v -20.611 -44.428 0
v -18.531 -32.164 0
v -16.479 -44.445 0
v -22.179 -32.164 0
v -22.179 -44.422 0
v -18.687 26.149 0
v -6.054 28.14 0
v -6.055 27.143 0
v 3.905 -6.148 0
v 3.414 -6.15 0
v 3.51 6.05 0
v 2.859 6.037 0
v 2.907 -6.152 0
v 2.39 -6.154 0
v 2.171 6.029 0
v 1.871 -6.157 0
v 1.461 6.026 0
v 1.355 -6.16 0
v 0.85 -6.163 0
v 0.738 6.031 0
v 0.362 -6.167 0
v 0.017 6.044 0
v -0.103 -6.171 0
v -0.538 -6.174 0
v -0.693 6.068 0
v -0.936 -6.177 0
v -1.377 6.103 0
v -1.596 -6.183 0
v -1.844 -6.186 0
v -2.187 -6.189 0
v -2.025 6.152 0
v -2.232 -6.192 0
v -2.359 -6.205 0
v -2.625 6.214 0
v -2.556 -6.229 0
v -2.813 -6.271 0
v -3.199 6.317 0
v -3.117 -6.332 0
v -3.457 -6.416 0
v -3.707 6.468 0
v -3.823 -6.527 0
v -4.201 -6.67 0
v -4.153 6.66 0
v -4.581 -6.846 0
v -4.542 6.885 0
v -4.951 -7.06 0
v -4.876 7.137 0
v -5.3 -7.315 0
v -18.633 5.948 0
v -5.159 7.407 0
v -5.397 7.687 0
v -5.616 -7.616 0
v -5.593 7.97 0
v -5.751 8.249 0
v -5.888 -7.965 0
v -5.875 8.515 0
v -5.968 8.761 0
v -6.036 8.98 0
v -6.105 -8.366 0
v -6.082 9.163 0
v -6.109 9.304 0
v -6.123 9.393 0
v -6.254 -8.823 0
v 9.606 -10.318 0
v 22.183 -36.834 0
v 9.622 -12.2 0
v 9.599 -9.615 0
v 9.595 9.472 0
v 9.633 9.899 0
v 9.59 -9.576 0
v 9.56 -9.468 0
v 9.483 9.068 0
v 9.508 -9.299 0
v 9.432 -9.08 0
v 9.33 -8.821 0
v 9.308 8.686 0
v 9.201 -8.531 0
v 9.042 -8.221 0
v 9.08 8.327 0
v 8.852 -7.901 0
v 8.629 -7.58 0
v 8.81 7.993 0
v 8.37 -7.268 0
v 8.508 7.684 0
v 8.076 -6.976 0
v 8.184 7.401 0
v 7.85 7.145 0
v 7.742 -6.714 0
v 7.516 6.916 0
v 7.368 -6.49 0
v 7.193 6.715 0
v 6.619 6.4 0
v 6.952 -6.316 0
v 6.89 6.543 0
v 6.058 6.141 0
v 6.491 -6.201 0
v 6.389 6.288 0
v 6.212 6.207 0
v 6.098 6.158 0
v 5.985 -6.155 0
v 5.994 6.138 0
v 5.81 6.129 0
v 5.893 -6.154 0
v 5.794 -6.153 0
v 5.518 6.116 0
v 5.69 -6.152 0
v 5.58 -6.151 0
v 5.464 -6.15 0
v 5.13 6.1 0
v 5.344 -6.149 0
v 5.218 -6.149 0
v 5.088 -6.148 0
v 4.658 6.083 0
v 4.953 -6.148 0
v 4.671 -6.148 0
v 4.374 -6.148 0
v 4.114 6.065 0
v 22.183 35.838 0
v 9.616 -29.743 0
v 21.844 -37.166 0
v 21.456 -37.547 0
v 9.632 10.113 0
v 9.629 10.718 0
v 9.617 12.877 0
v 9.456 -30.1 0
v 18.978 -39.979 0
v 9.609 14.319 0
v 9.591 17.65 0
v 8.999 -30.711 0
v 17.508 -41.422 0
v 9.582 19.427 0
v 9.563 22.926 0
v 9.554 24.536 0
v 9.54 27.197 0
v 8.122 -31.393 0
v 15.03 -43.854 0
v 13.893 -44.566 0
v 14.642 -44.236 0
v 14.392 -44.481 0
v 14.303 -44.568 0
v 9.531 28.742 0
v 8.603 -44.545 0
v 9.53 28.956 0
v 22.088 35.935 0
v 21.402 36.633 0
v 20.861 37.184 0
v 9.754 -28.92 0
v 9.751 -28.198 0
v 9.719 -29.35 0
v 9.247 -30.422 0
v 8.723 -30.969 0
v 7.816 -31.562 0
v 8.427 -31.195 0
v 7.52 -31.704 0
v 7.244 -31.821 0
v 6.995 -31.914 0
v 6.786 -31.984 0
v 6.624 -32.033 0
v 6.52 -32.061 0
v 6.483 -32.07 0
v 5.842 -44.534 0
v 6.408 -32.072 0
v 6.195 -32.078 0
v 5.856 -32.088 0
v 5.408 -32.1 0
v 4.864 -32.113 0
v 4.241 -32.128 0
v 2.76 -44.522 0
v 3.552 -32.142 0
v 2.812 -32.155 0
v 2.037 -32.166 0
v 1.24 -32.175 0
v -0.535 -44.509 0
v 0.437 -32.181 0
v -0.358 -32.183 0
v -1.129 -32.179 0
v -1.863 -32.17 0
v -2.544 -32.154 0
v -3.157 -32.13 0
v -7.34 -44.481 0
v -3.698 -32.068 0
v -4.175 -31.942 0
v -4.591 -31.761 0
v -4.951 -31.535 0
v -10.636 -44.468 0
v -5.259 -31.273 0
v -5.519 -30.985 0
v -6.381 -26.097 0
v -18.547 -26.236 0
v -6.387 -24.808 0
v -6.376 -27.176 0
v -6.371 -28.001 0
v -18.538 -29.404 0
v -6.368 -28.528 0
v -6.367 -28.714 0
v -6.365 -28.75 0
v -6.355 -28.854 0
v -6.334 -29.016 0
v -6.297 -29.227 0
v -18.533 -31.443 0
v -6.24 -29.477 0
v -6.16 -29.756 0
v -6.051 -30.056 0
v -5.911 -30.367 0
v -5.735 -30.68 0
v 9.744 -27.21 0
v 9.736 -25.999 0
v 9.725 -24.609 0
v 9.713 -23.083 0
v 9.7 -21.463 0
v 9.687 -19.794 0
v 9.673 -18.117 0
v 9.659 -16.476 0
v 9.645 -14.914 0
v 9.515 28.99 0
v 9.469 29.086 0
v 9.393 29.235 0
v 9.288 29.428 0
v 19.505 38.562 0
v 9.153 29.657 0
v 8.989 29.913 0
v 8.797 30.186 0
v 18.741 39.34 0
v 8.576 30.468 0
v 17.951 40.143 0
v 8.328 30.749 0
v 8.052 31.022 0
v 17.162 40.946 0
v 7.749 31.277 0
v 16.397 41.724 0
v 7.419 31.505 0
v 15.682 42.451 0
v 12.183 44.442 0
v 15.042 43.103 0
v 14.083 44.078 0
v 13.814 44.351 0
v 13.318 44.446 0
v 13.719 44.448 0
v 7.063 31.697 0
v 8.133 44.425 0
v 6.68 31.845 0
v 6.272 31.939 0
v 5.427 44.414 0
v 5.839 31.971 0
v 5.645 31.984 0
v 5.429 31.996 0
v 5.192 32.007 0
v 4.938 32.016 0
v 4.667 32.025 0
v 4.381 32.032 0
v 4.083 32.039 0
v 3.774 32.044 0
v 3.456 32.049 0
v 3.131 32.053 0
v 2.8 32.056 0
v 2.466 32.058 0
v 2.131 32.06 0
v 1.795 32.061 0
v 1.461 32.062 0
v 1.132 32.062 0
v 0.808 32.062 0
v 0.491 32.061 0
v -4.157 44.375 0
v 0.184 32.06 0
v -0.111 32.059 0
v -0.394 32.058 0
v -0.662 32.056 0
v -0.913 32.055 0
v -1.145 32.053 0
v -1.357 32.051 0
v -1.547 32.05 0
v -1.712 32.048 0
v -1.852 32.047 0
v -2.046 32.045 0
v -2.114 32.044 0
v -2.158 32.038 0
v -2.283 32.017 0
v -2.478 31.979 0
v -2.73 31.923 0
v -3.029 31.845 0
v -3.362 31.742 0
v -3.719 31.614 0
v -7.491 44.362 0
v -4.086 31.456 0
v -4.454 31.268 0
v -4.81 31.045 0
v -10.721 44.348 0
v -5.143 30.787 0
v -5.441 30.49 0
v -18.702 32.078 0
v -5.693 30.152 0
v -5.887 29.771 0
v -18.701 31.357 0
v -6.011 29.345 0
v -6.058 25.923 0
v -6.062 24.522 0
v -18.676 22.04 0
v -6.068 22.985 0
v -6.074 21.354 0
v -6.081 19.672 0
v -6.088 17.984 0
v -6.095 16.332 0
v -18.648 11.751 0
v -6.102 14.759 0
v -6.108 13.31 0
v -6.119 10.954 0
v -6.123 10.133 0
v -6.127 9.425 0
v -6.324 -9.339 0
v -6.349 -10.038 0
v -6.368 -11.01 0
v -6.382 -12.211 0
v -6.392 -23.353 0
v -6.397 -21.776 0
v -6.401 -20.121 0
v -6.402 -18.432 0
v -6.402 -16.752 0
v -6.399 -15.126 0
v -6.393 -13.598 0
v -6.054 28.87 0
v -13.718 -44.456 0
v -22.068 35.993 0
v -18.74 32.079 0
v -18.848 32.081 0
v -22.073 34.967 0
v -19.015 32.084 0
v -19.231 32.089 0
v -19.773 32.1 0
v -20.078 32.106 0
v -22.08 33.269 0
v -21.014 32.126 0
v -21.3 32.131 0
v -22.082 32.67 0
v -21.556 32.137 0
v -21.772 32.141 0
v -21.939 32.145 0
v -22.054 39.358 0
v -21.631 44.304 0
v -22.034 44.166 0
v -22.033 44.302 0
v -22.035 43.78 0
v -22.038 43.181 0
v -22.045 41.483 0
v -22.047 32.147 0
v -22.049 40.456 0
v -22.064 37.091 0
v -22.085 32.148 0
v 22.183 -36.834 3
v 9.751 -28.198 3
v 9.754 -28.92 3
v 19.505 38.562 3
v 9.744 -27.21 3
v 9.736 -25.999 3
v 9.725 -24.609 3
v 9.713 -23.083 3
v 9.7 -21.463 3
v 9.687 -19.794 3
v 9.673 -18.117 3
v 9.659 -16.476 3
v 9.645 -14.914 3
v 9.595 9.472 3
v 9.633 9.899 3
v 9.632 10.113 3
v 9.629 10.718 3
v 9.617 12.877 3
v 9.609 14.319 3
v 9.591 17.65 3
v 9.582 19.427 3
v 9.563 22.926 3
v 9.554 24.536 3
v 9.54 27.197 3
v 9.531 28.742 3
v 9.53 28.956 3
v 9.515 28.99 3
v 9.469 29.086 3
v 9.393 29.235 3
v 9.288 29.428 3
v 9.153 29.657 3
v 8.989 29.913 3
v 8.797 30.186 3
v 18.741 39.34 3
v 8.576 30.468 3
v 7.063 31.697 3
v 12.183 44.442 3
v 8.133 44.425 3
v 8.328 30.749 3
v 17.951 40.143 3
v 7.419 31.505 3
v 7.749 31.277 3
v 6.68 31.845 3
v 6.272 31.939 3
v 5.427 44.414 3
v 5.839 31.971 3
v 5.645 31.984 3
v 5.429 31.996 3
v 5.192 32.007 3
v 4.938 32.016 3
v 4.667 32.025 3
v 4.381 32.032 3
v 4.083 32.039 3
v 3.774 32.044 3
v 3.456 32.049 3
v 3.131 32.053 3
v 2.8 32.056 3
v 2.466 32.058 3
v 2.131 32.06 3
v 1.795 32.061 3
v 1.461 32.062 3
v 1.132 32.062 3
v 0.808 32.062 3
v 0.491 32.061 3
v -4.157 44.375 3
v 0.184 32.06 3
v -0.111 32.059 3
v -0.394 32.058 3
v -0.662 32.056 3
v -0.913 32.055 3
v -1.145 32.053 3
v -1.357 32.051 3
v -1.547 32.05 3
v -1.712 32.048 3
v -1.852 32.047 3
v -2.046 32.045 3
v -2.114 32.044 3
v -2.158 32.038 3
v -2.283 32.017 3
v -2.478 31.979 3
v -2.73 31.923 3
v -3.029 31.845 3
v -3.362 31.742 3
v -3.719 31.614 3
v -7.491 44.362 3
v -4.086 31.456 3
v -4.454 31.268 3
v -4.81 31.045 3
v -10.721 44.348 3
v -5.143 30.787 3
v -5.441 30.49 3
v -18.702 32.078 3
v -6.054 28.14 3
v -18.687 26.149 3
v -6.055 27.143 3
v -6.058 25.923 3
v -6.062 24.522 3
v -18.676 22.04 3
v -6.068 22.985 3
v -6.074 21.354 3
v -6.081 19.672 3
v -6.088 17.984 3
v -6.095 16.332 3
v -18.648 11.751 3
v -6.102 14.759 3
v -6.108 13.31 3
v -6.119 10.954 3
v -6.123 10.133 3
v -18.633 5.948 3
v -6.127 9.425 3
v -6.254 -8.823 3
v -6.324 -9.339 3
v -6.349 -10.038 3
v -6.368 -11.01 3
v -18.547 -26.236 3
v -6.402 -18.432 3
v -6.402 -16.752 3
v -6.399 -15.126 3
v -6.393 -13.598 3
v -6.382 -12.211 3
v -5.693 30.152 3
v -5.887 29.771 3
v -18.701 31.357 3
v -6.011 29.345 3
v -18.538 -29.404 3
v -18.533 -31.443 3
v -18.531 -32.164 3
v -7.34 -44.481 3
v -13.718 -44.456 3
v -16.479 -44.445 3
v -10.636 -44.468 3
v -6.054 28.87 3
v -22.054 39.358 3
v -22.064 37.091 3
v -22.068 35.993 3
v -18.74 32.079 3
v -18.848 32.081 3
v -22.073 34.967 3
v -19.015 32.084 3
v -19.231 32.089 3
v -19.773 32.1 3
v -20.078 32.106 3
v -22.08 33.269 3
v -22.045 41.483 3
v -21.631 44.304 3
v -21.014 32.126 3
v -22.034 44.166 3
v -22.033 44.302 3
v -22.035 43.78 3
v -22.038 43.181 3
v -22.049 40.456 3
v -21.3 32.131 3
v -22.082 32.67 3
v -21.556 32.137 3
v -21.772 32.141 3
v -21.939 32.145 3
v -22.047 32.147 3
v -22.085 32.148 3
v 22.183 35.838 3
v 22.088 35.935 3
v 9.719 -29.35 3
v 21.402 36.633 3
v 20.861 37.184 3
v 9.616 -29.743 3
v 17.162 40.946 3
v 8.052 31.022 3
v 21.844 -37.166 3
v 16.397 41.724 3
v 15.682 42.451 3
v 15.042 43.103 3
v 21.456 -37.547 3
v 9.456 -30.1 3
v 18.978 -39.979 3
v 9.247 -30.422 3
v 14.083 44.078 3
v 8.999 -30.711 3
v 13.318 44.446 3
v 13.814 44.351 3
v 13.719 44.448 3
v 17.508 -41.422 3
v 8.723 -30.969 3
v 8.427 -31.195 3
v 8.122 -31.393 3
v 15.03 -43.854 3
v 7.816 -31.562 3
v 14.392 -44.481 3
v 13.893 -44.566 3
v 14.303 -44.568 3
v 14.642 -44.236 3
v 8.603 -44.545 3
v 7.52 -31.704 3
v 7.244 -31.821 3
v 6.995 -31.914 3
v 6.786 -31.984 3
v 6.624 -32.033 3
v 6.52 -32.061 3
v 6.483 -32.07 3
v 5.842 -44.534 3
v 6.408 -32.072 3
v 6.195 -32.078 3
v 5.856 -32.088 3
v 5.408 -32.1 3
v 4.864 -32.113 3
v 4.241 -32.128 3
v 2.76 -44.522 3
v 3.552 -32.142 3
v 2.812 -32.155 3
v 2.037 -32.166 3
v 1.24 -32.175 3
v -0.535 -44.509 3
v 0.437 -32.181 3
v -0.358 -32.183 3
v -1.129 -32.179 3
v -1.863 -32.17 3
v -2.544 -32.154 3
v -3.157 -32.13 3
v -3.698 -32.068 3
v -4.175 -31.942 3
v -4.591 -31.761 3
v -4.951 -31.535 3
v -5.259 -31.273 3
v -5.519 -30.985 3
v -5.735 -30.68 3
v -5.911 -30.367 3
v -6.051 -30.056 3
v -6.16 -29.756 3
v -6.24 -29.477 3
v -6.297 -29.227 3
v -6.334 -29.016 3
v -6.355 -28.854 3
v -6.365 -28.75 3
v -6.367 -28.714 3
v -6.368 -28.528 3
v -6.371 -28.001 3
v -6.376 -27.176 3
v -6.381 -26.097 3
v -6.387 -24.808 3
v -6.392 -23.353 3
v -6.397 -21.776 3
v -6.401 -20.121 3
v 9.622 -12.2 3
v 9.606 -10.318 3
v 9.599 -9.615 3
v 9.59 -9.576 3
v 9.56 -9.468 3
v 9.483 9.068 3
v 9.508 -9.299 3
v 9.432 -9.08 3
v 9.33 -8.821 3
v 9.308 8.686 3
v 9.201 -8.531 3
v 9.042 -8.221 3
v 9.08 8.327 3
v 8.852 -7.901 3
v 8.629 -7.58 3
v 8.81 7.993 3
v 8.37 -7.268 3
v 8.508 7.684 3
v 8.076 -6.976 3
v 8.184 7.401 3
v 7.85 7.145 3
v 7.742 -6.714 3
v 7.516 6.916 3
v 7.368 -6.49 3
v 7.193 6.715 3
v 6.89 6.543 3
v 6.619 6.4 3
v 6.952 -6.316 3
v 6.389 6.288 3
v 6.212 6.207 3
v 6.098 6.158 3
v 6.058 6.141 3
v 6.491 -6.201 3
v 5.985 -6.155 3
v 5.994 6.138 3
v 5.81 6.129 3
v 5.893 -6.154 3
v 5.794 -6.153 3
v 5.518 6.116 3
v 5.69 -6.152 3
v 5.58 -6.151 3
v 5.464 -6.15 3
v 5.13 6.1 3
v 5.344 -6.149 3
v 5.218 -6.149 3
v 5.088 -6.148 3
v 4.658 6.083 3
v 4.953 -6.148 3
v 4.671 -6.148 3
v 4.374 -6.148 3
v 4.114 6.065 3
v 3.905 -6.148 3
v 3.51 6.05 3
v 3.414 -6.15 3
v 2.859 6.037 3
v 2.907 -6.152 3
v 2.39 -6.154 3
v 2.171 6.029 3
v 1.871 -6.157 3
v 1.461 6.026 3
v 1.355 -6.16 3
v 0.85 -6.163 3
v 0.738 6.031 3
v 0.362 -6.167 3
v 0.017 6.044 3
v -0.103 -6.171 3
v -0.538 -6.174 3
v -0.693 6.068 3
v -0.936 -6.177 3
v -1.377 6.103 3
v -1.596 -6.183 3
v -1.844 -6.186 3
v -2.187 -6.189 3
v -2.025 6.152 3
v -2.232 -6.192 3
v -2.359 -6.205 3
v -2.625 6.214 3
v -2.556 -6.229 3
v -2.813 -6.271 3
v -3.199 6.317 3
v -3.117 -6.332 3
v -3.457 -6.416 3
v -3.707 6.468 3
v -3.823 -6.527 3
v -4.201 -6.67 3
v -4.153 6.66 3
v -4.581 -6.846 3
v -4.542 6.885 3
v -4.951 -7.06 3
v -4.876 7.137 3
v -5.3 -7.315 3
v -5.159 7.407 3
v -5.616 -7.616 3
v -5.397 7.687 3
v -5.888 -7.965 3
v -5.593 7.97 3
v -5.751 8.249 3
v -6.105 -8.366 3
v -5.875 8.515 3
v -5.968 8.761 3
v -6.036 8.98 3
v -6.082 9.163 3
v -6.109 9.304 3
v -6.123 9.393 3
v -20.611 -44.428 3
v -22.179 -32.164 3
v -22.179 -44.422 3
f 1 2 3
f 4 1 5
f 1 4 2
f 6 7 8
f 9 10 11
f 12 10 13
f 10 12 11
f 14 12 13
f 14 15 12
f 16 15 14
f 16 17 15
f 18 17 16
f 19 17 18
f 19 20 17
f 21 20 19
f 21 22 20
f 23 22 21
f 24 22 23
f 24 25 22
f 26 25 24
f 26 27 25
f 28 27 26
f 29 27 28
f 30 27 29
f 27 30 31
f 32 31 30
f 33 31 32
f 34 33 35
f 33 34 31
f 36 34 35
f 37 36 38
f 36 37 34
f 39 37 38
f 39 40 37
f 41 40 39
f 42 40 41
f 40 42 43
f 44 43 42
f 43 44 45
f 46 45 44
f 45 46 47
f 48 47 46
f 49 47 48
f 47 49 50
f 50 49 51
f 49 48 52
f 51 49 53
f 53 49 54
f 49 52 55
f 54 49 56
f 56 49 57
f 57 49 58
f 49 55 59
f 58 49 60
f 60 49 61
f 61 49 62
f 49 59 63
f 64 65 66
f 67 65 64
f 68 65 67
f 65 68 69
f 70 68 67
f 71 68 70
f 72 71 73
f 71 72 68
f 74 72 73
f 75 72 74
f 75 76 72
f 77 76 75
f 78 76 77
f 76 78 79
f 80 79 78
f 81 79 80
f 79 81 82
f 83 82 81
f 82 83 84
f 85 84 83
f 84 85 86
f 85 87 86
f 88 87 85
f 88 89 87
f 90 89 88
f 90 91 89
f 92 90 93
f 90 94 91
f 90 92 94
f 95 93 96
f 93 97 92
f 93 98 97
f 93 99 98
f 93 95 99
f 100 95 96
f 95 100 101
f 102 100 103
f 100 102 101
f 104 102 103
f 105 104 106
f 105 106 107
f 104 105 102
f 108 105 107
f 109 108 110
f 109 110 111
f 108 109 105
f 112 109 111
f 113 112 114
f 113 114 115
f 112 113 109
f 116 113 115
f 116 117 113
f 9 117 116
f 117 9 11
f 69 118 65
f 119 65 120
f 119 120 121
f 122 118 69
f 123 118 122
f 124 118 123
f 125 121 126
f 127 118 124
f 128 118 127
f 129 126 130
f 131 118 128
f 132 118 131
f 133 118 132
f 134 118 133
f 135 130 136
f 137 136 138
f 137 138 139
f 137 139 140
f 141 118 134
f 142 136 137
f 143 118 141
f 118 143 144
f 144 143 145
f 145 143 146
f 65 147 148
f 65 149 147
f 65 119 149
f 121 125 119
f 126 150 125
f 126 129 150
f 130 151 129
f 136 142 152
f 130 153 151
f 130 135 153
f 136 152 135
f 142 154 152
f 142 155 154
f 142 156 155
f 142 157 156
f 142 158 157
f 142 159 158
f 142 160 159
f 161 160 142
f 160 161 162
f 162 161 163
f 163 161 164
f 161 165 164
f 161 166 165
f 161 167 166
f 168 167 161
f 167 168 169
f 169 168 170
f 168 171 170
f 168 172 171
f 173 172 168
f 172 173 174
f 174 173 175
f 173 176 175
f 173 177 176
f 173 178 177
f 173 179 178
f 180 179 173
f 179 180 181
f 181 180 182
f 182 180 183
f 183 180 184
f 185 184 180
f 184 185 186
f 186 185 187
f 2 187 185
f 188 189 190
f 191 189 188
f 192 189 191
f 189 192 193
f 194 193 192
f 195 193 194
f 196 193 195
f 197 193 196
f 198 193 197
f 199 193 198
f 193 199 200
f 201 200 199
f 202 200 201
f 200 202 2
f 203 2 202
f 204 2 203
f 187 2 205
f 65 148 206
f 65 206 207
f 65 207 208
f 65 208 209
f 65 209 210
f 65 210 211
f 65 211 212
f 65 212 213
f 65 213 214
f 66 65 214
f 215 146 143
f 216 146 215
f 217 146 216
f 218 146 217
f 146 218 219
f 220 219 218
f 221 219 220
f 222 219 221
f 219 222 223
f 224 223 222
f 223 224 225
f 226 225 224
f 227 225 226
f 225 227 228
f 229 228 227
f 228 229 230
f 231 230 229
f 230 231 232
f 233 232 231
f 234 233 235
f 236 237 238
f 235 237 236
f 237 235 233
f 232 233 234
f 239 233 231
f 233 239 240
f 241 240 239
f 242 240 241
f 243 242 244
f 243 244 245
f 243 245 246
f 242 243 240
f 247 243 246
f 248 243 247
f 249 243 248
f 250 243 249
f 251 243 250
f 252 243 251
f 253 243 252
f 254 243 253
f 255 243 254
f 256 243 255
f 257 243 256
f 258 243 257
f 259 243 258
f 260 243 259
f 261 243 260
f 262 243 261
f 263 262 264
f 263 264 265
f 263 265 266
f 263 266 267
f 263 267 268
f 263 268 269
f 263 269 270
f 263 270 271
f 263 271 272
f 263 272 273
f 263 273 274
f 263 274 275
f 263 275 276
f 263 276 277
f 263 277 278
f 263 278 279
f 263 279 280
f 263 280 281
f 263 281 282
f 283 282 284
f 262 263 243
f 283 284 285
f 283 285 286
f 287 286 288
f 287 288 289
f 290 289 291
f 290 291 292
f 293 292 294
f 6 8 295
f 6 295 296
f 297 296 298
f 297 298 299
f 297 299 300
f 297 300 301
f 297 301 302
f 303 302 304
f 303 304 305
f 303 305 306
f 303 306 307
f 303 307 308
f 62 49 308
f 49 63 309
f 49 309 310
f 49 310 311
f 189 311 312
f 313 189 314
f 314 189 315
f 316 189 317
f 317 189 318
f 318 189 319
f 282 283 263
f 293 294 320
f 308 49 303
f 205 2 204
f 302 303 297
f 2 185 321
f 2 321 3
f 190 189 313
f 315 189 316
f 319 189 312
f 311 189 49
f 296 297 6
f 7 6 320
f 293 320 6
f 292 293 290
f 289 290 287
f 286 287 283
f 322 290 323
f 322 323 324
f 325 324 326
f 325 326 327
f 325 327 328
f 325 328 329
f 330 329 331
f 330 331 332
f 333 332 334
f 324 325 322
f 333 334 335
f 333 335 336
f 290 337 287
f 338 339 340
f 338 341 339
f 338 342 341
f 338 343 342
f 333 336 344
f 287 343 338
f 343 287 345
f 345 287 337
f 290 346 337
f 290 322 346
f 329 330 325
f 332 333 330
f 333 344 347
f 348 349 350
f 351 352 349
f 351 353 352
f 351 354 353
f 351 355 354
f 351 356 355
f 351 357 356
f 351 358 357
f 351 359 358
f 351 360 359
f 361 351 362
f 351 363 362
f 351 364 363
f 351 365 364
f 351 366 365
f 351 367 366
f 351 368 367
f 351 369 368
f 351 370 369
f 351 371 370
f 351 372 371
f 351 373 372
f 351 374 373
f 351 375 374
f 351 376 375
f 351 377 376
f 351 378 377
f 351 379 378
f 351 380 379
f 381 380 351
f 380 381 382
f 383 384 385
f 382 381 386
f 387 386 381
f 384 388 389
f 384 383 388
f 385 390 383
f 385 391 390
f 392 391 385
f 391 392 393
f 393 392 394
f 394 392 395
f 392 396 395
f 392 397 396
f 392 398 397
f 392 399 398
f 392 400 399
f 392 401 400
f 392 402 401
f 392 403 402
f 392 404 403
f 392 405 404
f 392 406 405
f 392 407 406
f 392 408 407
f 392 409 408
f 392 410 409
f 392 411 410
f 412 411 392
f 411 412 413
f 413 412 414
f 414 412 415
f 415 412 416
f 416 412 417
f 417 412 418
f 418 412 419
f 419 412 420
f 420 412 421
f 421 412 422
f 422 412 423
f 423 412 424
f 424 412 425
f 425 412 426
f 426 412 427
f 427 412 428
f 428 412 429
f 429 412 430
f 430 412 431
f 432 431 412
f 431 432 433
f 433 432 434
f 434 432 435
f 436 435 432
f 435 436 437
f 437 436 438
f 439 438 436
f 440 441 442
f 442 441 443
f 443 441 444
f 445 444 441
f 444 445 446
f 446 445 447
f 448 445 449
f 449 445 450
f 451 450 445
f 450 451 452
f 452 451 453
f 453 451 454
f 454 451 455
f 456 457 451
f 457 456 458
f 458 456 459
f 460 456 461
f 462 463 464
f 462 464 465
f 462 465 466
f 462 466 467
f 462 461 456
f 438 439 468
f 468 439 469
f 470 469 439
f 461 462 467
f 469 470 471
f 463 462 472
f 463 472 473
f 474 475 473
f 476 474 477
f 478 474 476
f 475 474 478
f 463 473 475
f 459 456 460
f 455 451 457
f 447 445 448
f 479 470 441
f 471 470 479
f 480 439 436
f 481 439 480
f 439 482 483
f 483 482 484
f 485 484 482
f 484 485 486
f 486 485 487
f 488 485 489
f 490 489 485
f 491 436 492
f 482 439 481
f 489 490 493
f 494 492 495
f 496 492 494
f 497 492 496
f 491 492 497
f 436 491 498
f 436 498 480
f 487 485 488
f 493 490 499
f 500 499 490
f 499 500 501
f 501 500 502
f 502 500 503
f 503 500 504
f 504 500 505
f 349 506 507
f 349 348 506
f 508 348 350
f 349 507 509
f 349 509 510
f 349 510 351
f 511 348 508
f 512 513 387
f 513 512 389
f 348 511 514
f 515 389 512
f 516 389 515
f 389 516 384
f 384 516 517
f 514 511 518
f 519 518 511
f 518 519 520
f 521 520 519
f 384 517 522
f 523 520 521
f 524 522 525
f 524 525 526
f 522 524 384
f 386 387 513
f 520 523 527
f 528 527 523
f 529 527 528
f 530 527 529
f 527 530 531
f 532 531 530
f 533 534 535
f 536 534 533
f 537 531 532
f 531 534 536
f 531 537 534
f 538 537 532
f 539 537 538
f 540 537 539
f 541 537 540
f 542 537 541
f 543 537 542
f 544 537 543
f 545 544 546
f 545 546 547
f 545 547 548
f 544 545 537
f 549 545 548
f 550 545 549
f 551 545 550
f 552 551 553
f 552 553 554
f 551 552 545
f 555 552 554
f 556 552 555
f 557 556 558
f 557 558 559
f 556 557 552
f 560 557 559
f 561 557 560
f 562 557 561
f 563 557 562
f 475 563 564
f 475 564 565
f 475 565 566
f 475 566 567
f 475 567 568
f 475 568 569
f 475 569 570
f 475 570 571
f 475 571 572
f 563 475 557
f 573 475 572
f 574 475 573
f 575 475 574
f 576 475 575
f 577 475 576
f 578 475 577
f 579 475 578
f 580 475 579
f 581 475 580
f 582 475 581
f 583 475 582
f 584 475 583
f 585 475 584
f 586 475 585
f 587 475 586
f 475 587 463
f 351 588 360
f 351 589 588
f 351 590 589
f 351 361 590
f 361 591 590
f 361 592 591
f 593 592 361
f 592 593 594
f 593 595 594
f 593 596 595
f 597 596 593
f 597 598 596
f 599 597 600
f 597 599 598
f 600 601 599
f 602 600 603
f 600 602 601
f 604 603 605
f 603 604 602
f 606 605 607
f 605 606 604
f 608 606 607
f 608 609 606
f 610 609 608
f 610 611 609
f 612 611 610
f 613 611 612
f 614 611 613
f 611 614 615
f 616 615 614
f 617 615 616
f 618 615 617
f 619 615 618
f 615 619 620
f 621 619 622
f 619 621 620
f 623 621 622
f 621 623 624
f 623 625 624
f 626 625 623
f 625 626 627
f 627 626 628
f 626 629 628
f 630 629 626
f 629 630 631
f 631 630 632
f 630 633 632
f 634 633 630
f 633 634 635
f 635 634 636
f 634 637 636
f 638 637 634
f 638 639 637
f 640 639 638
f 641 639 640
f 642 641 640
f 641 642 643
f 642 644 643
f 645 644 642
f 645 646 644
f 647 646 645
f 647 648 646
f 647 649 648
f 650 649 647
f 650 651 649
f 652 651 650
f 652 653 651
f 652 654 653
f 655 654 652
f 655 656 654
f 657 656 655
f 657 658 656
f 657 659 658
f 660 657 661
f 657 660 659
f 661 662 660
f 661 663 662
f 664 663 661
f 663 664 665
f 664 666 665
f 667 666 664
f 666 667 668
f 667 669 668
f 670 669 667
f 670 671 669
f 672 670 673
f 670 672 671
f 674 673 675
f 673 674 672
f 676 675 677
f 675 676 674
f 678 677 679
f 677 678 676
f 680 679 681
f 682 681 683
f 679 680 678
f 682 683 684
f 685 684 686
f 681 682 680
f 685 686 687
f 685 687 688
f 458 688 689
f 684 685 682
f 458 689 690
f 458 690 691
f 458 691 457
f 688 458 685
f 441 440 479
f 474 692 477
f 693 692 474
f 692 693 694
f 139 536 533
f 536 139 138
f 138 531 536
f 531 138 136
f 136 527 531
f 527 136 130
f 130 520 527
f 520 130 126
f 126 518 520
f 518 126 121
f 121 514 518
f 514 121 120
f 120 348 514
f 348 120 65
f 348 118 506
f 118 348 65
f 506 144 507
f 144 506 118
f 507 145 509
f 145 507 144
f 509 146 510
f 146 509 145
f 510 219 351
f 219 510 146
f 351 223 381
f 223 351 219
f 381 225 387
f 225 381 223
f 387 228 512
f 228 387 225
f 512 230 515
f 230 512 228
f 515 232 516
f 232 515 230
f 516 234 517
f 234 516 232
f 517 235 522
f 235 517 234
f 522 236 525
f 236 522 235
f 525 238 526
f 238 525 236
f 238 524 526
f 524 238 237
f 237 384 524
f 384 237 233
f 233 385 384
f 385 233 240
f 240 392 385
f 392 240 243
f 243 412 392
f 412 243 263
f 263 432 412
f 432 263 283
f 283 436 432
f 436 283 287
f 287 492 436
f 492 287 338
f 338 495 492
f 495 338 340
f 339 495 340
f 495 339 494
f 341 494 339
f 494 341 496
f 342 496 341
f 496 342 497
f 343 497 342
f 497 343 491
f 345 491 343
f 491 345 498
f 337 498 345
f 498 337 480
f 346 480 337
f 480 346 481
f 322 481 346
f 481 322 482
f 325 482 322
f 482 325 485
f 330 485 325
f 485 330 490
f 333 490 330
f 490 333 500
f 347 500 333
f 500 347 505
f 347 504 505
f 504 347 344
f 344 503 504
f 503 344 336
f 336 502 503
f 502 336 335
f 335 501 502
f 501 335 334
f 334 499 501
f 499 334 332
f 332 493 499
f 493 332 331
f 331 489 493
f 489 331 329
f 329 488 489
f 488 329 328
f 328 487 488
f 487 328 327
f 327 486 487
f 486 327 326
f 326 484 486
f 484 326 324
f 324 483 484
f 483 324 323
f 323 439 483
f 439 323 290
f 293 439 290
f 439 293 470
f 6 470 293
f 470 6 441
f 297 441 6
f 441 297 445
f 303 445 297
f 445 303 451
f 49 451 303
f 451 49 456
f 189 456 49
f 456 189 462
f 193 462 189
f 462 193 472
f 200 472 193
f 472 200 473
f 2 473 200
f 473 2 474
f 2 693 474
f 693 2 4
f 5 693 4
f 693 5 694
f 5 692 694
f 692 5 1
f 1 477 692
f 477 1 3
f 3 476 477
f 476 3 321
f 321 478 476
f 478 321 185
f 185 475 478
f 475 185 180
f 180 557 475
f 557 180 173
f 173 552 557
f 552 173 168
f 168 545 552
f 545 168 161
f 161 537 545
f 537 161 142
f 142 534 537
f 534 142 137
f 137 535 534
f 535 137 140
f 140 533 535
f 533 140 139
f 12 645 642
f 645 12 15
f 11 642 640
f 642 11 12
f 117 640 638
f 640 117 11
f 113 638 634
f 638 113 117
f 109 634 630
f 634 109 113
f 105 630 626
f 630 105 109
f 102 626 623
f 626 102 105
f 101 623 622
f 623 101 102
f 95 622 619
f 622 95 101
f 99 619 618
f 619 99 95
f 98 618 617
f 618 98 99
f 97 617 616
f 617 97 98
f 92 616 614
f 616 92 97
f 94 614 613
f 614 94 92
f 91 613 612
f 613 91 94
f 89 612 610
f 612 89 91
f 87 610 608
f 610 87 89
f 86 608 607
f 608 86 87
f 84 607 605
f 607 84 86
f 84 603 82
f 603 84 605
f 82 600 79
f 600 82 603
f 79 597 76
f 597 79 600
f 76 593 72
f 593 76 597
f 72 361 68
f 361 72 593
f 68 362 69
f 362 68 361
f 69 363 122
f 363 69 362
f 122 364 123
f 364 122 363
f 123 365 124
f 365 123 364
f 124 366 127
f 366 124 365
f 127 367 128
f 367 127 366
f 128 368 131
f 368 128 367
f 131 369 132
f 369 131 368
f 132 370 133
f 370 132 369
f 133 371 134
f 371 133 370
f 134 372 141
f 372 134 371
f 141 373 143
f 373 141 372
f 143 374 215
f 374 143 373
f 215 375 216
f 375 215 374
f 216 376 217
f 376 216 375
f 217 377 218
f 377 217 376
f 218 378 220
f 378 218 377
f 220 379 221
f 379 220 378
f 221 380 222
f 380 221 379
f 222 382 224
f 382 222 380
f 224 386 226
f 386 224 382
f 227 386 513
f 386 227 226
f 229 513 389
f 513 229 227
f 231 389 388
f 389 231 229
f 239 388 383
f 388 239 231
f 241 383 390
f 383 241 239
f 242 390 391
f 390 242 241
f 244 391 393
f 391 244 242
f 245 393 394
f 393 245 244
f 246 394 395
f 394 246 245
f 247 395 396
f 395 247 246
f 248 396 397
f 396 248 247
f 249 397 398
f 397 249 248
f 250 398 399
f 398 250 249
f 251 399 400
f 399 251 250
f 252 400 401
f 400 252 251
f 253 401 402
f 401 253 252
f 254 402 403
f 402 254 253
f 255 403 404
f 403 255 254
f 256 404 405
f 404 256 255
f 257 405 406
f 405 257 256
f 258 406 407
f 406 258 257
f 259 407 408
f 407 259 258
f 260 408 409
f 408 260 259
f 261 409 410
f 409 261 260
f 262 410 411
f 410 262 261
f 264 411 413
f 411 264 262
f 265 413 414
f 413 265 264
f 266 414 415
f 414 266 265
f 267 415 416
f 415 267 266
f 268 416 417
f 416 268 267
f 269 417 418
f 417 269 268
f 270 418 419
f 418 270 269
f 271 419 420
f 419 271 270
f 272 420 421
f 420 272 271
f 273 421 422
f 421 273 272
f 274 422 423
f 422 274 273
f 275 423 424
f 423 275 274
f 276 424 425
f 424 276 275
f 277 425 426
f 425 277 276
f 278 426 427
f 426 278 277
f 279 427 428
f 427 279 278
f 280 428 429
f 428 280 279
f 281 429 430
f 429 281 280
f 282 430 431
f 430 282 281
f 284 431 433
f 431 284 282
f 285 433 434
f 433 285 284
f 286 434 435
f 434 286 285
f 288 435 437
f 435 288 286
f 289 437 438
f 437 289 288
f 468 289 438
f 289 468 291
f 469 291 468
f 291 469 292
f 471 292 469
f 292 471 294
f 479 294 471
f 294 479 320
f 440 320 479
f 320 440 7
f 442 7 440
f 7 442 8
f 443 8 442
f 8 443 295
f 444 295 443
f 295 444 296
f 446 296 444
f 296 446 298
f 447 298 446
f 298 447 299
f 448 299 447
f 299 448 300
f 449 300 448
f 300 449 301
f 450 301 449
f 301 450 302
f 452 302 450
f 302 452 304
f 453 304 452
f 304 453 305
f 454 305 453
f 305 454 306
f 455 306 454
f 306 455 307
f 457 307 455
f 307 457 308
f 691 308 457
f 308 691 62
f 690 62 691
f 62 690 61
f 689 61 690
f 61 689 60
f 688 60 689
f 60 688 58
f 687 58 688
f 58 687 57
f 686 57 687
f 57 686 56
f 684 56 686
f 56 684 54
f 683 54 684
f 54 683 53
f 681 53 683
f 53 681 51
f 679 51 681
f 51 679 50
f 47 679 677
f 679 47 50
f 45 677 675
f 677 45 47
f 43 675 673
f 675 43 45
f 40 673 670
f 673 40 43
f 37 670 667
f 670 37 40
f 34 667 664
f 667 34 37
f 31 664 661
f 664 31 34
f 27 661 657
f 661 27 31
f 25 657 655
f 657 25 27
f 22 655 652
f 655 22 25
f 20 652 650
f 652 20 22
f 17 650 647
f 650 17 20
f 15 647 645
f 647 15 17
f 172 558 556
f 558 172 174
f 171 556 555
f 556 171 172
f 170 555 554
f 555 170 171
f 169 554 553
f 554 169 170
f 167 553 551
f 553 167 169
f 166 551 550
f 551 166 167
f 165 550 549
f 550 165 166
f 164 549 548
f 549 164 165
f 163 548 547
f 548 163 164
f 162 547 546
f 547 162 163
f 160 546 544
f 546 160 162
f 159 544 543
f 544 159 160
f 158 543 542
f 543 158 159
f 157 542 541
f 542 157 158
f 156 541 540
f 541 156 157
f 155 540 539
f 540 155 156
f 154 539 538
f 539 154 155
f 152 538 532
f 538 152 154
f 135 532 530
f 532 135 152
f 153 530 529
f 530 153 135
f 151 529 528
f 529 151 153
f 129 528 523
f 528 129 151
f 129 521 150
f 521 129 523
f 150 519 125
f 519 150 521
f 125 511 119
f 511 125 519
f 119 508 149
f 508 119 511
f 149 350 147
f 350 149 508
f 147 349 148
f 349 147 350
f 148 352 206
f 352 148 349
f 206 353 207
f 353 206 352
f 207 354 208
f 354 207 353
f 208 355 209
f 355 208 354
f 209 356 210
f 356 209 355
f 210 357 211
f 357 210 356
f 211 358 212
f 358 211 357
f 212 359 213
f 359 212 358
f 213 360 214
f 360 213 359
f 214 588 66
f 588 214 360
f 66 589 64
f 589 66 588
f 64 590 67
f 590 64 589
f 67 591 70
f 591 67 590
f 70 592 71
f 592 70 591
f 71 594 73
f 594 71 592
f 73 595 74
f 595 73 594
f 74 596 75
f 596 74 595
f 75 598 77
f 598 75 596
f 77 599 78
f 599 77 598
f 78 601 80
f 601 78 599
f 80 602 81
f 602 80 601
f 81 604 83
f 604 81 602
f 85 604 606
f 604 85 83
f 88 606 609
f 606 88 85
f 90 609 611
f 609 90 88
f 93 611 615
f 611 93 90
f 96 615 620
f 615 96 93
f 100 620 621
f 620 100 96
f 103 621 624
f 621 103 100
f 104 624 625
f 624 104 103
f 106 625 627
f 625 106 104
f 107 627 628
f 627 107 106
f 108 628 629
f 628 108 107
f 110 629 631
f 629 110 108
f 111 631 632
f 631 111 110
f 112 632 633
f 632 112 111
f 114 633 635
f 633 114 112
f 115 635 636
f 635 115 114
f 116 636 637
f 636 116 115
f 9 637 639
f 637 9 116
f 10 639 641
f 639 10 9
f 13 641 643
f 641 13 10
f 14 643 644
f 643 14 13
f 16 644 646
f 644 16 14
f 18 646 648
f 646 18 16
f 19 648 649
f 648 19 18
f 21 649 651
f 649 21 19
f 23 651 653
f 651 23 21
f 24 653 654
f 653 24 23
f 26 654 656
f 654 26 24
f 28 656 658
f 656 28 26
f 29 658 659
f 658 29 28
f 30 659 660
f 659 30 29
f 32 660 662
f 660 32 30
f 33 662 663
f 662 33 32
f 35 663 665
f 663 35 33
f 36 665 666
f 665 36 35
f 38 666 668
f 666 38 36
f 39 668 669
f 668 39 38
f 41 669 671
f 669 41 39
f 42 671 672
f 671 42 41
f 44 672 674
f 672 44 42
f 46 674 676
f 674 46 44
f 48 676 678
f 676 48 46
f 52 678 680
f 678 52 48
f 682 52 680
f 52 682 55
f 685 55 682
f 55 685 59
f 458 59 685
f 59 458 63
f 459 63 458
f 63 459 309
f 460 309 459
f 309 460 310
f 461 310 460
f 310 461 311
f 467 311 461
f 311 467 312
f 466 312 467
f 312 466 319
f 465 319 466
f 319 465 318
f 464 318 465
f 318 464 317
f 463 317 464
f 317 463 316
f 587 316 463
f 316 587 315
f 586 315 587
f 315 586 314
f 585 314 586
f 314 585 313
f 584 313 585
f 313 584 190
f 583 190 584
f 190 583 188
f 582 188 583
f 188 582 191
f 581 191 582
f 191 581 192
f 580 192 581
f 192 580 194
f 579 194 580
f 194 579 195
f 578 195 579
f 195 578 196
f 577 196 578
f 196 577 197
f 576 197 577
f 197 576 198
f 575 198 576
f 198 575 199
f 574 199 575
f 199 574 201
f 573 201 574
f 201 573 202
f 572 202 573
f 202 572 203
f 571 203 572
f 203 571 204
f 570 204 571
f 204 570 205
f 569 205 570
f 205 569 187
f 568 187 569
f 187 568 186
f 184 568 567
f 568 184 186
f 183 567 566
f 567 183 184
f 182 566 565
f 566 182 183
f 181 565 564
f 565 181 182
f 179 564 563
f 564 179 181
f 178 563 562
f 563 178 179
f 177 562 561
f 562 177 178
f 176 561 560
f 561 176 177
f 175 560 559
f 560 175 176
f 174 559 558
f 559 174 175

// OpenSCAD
// Generated from 交通部公路局（原交通部公路總局）「新式號牌使用之英文字、數字字體」author trace
fudge = 0.1;

module glyph_2012_B(h = 3) {
  difference() {
    linear_extrude(height = h)
      polygon(points = [[13.7194, 44.448], [13.3179, 44.4463], [12.1832, 44.4417], [10.42, 44.4345], [8.1331, 44.4252], [5.4272, 44.4142], [2.4071, 44.4019], [-0.8225, 44.3887], [-4.1568, 44.3751], [-7.4911, 44.3616], [-10.7207, 44.3484], [-13.7408, 44.3361], [-16.4467, 44.3251], [-18.7336, 44.3158], [-20.4968, 44.3086], [-21.6315, 44.304], [-22.033, 44.3023], [-22.0336, 44.1658], [-22.0352, 43.7801], [-22.0378, 43.1806], [-22.0411, 42.4031], [-22.045, 41.4832], [-22.0493, 40.4565], [-22.054, 39.3585], [-22.0588, 38.2249], [-22.0636, 37.0914], [-22.0683, 35.9934], [-22.0726, 34.9667], [-22.0765, 34.0467], [-22.0798, 33.2693], [-22.0824, 32.6698], [-22.084, 32.2841], [-22.0846, 32.1476], [-22.0466, 32.1468], [-21.9393, 32.1446], [-21.7725, 32.1411], [-21.5561, 32.1367], [-21.3002, 32.1314], [-21.0145, 32.1256], [-20.709, 32.1193], [-20.3935, 32.1128], [-20.0781, 32.1063], [-19.7726, 32.1001], [-19.4869, 32.0942], [-19.2309, 32.0889], [-19.0146, 32.0845], [-18.8478, 32.081], [-18.7405, 32.0788], [-18.7025, 32.0781], [-18.7006, 31.3566], [-18.6951, 29.3176], [-18.6866, 26.1494], [-18.6757, 22.0402], [-18.6627, 17.1781], [-18.6482, 11.7514], [-18.6326, 5.9482], [-18.6166, -0.0431], [-18.6006, -6.0345], [-18.5851, -11.8376], [-18.5706, -17.2643], [-18.5576, -22.1264], [-18.5466, -26.2357], [-18.5382, -29.4039], [-18.5327, -31.4428], [-18.5308, -32.1643], [-18.5717, -32.1643], [-18.6875, -32.1643], [-18.8675, -32.1643], [-19.1008, -32.1643], [-19.3769, -32.1643], [-19.6851, -32.1643], [-20.0147, -32.1643], [-20.3549, -32.1643], [-20.6951, -32.1643], [-21.0247, -32.1643], [-21.3329, -32.1643], [-21.609, -32.1643], [-21.8424, -32.1643], [-22.0223, -32.1643], [-22.1381, -32.1643], [-22.179, -32.1643], [-22.179, -32.302], [-22.179, -32.691], [-22.179, -33.2955], [-22.179, -34.0796], [-22.179, -35.0073], [-22.179, -36.0428], [-22.179, -37.1501], [-22.179, -38.2933], [-22.179, -39.4365], [-22.179, -40.5438], [-22.179, -41.5792], [-22.179, -42.507], [-22.179, -43.2911], [-22.179, -43.8956], [-22.179, -44.2846], [-22.179, -44.4223], [-21.7693, -44.4239], [-20.6114, -44.4285], [-18.8123, -44.4357], [-16.4787, -44.445], [-13.7176, -44.4561], [-10.6358, -44.4684], [-7.3403, -44.4815], [-3.9379, -44.4951], [-0.5355, -44.5087], [2.76, -44.5218], [5.8417, -44.5341], [8.6028, -44.5452], [10.9364, -44.5545], [12.7356, -44.5617], [13.8934, -44.5663], [14.3032, -44.5679], [14.3917, -44.4811], [14.6417, -44.2356], [15.0304, -43.8542], [15.5344, -43.3595], [16.1308, -42.7741], [16.7964, -42.1208], [17.5082, -41.4221], [18.2431, -40.7008], [18.978, -39.9795], [19.6898, -39.2808], [20.3554, -38.6275], [20.9518, -38.0421], [21.4558, -37.5474], [21.8445, -37.166], [22.0946, -36.9205], [22.183, -36.8337], [22.183, -36.0175], [22.183, -33.711], [22.183, -30.1271], [22.183, -25.4787], [22.183, -19.9786], [22.183, -13.8398], [22.183, -7.2752], [22.183, -0.4977], [22.183, 6.2798], [22.183, 12.8444], [22.183, 18.9832], [22.183, 24.4833], [22.183, 29.1317], [22.183, 32.7157], [22.183, 35.0221], [22.183, 35.8383], [22.088, 35.935], [21.8194, 36.2082], [21.402, 36.6328], [20.8606, 37.1836], [20.22, 37.8352], [19.5051, 38.5624], [18.7406, 39.3402], [17.9512, 40.1431], [17.1619, 40.9461], [16.3973, 41.7238], [15.6824, 42.4511], [15.0418, 43.1027], [14.5005, 43.6534], [14.0831, 44.078], [13.8144, 44.3513]]);
    translate([0, 0, -fudge])
      linear_extrude(height = h + 2 * fudge)
        polygon(points = [[1.1318, 32.0623], [1.4615, 32.0621], [1.7951, 32.0614], [2.1306, 32.0602], [2.4664, 32.0584], [2.8005, 32.0559], [3.1311, 32.0527], [3.4563, 32.0488], [3.7744, 32.0441], [4.0834, 32.0386], [4.3815, 32.0321], [4.667, 32.0246], [4.9379, 32.0162], [5.1924, 32.0066], [5.4287, 31.996], [5.6448, 31.9841], [5.8391, 31.971], [6.2724, 31.939], [6.6803, 31.8447], [7.0626, 31.697], [7.4189, 31.5047], [7.7487, 31.2767], [8.0518, 31.0219], [8.3277, 30.7493], [8.5762, 30.4676], [8.7968, 30.1858], [8.9891, 29.9127], [9.1529, 29.6573], [9.2877, 29.4284], [9.3932, 29.2348], [9.469, 29.0856], [9.5147, 28.9896], [9.5301, 28.9556], [9.5312, 28.7416], [9.5345, 28.1368], [9.5396, 27.197], [9.5462, 25.9781], [9.554, 24.5358], [9.5628, 22.9261], [9.5721, 21.2048], [9.5817, 19.4275], [9.5914, 17.6503], [9.6007, 15.929], [9.6094, 14.3193], [9.6173, 12.877], [9.6239, 11.6581], [9.629, 10.7183], [9.6322, 10.1135], [9.6334, 9.8995], [9.5953, 9.4725], [9.4834, 9.0677], [9.3082, 8.6857], [9.0801, 8.3273], [8.8098, 7.9933], [8.5077, 7.6844], [8.1845, 7.4014], [7.8505, 7.145], [7.5164, 6.9159], [7.1927, 6.715], [6.8899, 6.5429], [6.6186, 6.4004], [6.3892, 6.2883], [6.2123, 6.2072], [6.0985, 6.1581], [6.0582, 6.1415], [5.9941, 6.1382], [5.81, 6.1292], [5.5178, 6.116], [5.1297, 6.1], [4.6576, 6.0827], [4.1137, 6.0654], [3.51, 6.0497], [2.8586, 6.0369], [2.1715, 6.0286], [1.4608, 6.0261], [0.7385, 6.0309], [0.0166, 6.0444], [-0.6926, 6.0681], [-1.3773, 6.1034], [-2.0253, 6.1517], [-2.6246, 6.2145], [-3.199, 6.3167], [-3.7073, 6.4677], [-4.1535, 6.6598], [-4.5416, 6.8855], [-4.8756, 7.137], [-5.1595, 7.4067], [-5.3974, 7.687], [-5.5932, 7.9703], [-5.751, 8.2489], [-5.8748, 8.5151], [-5.9685, 8.7613], [-6.0361, 8.9799], [-6.0818, 9.1632], [-6.1095, 9.3036], [-6.1231, 9.3934], [-6.1268, 9.4251], [-6.1259, 9.6094], [-6.1233, 10.1333], [-6.1194, 10.9537], [-6.1144, 12.027], [-6.1084, 13.31], [-6.1018, 14.7594], [-6.0948, 16.3318], [-6.0877, 17.9839], [-6.0806, 19.6723], [-6.0739, 21.3538], [-6.0677, 22.985], [-6.0624, 24.5225], [-6.0581, 25.9231], [-6.0551, 27.1434], [-6.0538, 28.1401], [-6.0542, 28.8698], [-6.011, 29.3446], [-5.8867, 29.7714], [-5.6929, 30.1524], [-5.4412, 30.4901], [-5.1431, 30.7869], [-4.8102, 31.0453], [-4.4541, 31.2676], [-4.0864, 31.4563], [-3.7186, 31.6138], [-3.3623, 31.7424], [-3.029, 31.8446], [-2.7304, 31.9228], [-2.478, 31.9795], [-2.2834, 32.0169], [-2.1581, 32.0377], [-2.1138, 32.044], [-2.0965, 32.0442], [-2.0459, 32.0448], [-1.9638, 32.0457], [-1.852, 32.0469], [-1.7124, 32.0482], [-1.5469, 32.0498], [-1.3572, 32.0514], [-1.1453, 32.0531], [-0.9128, 32.0548], [-0.6618, 32.0564], [-0.394, 32.0579], [-0.1113, 32.0593], [0.1844, 32.0605], [0.4915, 32.0614], [0.8079, 32.0619], [1.1318, 32.0621], [1.1318, 32.0621], [1.1318, 32.0621], [1.1318, 32.0621], [1.1318, 32.0622], [1.1318, 32.0622], [1.1318, 32.0622], [1.1318, 32.0622], [1.1318, 32.0622], [1.1318, 32.0622], [1.1318, 32.0623], [1.1318, 32.0623], [1.1318, 32.0623], [1.1318, 32.0623], [1.1318, 32.0623], [1.1318, 32.0623]]);
    translate([0, 0, -fudge])
      linear_extrude(height = h + 2 * fudge)
        polygon(points = [[3.9054, -6.148], [4.0645, -6.1479], [4.2209, -6.1478], [4.3742, -6.1477], [4.5243, -6.1477], [4.671, -6.1477], [4.8139, -6.1479], [4.9529, -6.1481], [5.0877, -6.1484], [5.218, -6.1488], [5.3436, -6.1493], [5.4643, -6.1499], [5.5798, -6.1507], [5.6899, -6.1516], [5.7943, -6.1526], [5.8928, -6.1537], [5.9851, -6.155], [6.4914, -6.201], [6.9517, -6.316], [7.368, -6.4902], [7.742, -6.7137], [8.0756, -6.9764], [8.3705, -7.2685], [8.6287, -7.58], [8.852, -7.9009], [9.0421, -8.2213], [9.201, -8.5313], [9.3304, -8.8208], [9.4321, -9.08], [9.5081, -9.299], [9.5601, -9.4677], [9.5899, -9.5762], [9.5995, -9.6146], [9.6011, -9.7977], [9.6057, -10.3183], [9.6128, -11.1333], [9.6221, -12.1996], [9.6331, -13.4742], [9.6455, -14.914], [9.6588, -16.4759], [9.6726, -18.1168], [9.6866, -19.7937], [9.7003, -21.4634], [9.7134, -23.083], [9.7253, -24.6093], [9.7358, -25.9992], [9.7444, -27.2097], [9.7507, -28.1976], [9.7543, -28.92], [9.719, -29.3499], [9.6163, -29.7427], [9.4557, -30.0996], [9.2469, -30.4221], [8.9995, -30.7113], [8.7232, -30.9686], [8.4274, -31.1953], [8.122, -31.3926], [7.8165, -31.5619], [7.5205, -31.7044], [7.2436, -31.8215], [6.9955, -31.9144], [6.7858, -31.9844], [6.624, -32.0327], [6.52, -32.0608], [6.4831, -32.0699], [6.4085, -32.0722], [6.1946, -32.0785], [5.8561, -32.088], [5.4078, -32.0999], [4.8645, -32.1134], [4.241, -32.1276], [3.552, -32.1417], [2.8123, -32.155], [2.0367, -32.1665], [1.24, -32.1755], [0.4369, -32.1811], [-0.3578, -32.1826], [-1.1293, -32.1791], [-1.8628, -32.1698], [-2.5436, -32.1539], [-3.1568, -32.1305], [-3.6979, -32.0681], [-4.1746, -31.9418], [-4.5911, -31.761], [-4.9513, -31.5351], [-5.2594, -31.2734], [-5.5194, -30.9853], [-5.7353, -30.6802], [-5.9113, -30.3674], [-6.0514, -30.0563], [-6.1596, -29.7563], [-6.24, -29.4768], [-6.2967, -29.2271], [-6.3337, -29.0165], [-6.3551, -28.8545], [-6.365, -28.7505], [-6.3674, -28.7137], [-6.3685, -28.5282], [-6.3715, -28.0009], [-6.3759, -27.1758], [-6.3812, -26.0969], [-6.3868, -24.808], [-6.3922, -23.353], [-6.397, -21.776], [-6.4006, -20.1209], [-6.4024, -18.4316], [-6.4021, -16.752], [-6.3989, -15.1261], [-6.3926, -13.5977], [-6.3825, -12.2109], [-6.368, -11.0096], [-6.3488, -10.0377], [-6.3243, -9.3392], [-6.2538, -8.8228], [-6.1046, -8.3659], [-5.8883, -7.9647], [-5.6162, -7.6157], [-5.3, -7.3153], [-4.951, -7.0598], [-4.5808, -6.8458], [-4.2008, -6.6696], [-3.8226, -6.5275], [-3.4575, -6.4161], [-3.1171, -6.3317], [-2.8128, -6.2707], [-2.5562, -6.2295], [-2.3586, -6.2046], [-2.2317, -6.1922], [-2.1868, -6.1889], [-2.1466, -6.1885], [-2.0303, -6.1874], [-1.8445, -6.1856], [-1.5957, -6.1833], [-1.2906, -6.1806], [-0.9358, -6.1775], [-0.5377, -6.1741], [-0.1029, -6.1706], [0.3619, -6.1671], [0.8502, -6.1635], [1.3554, -6.1601], [1.871, -6.1569], [2.3904, -6.1541], [2.907, -6.1516], [3.4142, -6.1496], [3.9054, -6.1483], [3.9054, -6.1483], [3.9054, -6.1483], [3.9054, -6.1483], [3.9054, -6.1483], [3.9054, -6.1482], [3.9054, -6.1482], [3.9054, -6.1482], [3.9054, -6.1482], [3.9054, -6.1481], [3.9054, -6.1481], [3.9054, -6.1481], [3.9054, -6.1481], [3.9054, -6.1481], [3.9054, -6.1481], [3.9054, -6.148]]);
  }
}

glyph_2012_B();
